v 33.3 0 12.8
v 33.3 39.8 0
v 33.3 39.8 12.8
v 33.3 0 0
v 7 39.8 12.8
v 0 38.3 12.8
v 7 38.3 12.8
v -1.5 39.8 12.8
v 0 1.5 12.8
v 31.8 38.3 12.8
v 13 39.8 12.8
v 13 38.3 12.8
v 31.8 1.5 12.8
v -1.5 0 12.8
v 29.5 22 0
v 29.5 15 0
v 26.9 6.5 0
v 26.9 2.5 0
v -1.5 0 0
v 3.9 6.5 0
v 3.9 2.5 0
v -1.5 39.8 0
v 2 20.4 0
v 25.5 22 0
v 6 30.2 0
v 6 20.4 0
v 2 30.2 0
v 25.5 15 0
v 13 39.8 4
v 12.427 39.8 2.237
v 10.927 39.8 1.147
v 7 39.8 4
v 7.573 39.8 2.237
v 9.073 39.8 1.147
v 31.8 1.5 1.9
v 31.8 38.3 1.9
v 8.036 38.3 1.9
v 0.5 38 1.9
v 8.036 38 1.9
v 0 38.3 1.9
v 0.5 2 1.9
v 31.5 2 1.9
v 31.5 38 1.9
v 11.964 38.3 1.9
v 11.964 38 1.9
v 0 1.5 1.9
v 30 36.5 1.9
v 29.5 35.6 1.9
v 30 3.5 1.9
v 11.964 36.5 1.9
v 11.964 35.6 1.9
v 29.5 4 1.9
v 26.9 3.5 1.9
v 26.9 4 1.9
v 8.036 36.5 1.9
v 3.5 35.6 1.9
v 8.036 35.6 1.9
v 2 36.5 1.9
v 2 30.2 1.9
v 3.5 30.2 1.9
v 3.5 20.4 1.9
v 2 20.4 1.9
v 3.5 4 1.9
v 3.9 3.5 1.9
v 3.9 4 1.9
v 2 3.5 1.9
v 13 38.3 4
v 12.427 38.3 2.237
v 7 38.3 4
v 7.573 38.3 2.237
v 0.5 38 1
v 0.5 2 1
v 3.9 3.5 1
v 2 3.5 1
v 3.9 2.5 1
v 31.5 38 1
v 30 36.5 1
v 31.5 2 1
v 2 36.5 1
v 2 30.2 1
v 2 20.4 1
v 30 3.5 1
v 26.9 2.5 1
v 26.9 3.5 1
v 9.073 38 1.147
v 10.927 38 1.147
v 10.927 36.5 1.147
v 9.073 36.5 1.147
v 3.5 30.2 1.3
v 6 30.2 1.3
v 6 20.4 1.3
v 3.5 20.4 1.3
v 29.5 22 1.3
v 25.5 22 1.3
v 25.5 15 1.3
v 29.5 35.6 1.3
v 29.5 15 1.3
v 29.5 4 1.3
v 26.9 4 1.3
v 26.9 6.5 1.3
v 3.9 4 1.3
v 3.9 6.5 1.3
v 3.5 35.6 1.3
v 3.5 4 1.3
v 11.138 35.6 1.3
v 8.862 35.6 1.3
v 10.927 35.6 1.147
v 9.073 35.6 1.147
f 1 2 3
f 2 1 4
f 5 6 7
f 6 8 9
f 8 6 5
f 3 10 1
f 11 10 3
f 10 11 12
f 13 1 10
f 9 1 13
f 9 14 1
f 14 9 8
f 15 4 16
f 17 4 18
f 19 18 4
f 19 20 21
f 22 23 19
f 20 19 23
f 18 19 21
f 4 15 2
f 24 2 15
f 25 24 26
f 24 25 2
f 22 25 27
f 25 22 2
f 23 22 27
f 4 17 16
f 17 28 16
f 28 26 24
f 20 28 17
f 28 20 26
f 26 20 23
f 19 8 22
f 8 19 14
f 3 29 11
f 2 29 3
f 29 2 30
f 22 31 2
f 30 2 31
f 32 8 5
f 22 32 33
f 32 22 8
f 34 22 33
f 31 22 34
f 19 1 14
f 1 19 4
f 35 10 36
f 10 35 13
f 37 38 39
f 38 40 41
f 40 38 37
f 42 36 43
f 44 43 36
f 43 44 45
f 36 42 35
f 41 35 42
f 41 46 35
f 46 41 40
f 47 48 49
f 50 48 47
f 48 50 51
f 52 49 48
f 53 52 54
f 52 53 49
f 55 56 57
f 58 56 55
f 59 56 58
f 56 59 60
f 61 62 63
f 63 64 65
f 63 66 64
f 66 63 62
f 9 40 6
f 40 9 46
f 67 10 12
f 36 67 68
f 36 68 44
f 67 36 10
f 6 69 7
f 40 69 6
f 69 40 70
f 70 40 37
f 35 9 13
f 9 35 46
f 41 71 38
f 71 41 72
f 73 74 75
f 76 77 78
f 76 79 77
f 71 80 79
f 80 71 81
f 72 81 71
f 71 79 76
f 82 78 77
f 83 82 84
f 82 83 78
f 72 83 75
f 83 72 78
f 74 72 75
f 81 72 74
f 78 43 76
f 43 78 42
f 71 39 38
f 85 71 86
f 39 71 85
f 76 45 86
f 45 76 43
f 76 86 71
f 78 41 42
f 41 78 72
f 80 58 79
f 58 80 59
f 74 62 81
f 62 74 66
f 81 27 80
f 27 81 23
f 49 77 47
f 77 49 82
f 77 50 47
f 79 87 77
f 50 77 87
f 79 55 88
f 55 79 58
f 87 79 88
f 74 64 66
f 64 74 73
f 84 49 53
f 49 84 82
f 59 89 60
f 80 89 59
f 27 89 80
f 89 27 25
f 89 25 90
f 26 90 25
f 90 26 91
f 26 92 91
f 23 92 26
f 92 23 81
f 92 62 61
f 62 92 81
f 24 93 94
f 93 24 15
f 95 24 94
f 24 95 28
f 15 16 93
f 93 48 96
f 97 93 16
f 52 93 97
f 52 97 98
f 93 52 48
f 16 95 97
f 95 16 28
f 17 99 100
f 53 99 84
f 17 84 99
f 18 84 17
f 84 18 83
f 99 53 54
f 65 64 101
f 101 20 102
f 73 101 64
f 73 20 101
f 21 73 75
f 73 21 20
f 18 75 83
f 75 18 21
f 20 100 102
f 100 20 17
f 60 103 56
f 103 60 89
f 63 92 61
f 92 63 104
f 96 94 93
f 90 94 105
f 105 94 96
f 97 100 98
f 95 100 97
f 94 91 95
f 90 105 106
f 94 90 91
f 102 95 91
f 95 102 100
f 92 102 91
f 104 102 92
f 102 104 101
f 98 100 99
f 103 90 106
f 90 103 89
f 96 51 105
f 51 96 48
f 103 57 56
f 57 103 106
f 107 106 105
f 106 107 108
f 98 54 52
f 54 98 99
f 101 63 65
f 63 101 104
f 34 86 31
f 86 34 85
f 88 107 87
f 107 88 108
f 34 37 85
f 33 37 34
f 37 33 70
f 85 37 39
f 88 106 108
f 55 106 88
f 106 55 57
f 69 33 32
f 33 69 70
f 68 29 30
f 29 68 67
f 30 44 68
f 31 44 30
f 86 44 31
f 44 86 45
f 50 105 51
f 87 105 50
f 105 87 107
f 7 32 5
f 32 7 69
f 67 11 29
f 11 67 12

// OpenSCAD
module weatherRadio(){
	translate([23.5,16.4,-2])
	rotate([90,0,90])
	cube([9.8, 12, 4]);

	translate([0,11,-2])
	rotate([90,0,90])
	cube([7, 12, 4]);

	translate([2.6,2.5,-2])
	rotate([90,0,0])
	cube([23, 12, 4]);

	cube([26, 31.6, 6.7]);
	translate([19.5,31.6, 4.0])
	rotate([90,0,180])
	cylinder(h=8, r=3);
	translate([16.5,31.6, -6])	
	cube([6, 8, 10]);
}


module base(){
	difference(){
		difference(){
			cube([31, 36, 11]);
			translate([1.5, 1.5, 2])
			cube([28, 33, 13.5]);
		}
		translate([2, 2, 4])
		weatherRadio();
	}
}

module baseRadio(){
	color("Red")
	base();
	color("Green")
	translate([2, 2, 4])
	weatherRadio();	
}

module holder(x, y, z, width, cleareance){
    wall = (2*width) + (2*cleareance) ;
    trans = width + cleareance; 
    difference(){
        cube([x + wall, y + wall, z + wall]);
        translate([width , width, trans])
        cube([x + (2*cleareance) , y + (2*cleareance), z + wall+1]);
    }
}

module finalCover(){
 
	difference(){
		translate([34.5, 0, 12])
		rotate([0,180,0])
		   holder(31, 36 ,9, 1.5, .4);
           translate([1.5, 2, 0])
           baseRadio();
	}
}


//weatherRadio();

//finalCover();
//translate([1.5, 2, 0])
//base();
//print
//translate([-35, 0, 0])
//base();
rotate([0,180, 0])
translate([-33, 0, -12])
finalCover();
